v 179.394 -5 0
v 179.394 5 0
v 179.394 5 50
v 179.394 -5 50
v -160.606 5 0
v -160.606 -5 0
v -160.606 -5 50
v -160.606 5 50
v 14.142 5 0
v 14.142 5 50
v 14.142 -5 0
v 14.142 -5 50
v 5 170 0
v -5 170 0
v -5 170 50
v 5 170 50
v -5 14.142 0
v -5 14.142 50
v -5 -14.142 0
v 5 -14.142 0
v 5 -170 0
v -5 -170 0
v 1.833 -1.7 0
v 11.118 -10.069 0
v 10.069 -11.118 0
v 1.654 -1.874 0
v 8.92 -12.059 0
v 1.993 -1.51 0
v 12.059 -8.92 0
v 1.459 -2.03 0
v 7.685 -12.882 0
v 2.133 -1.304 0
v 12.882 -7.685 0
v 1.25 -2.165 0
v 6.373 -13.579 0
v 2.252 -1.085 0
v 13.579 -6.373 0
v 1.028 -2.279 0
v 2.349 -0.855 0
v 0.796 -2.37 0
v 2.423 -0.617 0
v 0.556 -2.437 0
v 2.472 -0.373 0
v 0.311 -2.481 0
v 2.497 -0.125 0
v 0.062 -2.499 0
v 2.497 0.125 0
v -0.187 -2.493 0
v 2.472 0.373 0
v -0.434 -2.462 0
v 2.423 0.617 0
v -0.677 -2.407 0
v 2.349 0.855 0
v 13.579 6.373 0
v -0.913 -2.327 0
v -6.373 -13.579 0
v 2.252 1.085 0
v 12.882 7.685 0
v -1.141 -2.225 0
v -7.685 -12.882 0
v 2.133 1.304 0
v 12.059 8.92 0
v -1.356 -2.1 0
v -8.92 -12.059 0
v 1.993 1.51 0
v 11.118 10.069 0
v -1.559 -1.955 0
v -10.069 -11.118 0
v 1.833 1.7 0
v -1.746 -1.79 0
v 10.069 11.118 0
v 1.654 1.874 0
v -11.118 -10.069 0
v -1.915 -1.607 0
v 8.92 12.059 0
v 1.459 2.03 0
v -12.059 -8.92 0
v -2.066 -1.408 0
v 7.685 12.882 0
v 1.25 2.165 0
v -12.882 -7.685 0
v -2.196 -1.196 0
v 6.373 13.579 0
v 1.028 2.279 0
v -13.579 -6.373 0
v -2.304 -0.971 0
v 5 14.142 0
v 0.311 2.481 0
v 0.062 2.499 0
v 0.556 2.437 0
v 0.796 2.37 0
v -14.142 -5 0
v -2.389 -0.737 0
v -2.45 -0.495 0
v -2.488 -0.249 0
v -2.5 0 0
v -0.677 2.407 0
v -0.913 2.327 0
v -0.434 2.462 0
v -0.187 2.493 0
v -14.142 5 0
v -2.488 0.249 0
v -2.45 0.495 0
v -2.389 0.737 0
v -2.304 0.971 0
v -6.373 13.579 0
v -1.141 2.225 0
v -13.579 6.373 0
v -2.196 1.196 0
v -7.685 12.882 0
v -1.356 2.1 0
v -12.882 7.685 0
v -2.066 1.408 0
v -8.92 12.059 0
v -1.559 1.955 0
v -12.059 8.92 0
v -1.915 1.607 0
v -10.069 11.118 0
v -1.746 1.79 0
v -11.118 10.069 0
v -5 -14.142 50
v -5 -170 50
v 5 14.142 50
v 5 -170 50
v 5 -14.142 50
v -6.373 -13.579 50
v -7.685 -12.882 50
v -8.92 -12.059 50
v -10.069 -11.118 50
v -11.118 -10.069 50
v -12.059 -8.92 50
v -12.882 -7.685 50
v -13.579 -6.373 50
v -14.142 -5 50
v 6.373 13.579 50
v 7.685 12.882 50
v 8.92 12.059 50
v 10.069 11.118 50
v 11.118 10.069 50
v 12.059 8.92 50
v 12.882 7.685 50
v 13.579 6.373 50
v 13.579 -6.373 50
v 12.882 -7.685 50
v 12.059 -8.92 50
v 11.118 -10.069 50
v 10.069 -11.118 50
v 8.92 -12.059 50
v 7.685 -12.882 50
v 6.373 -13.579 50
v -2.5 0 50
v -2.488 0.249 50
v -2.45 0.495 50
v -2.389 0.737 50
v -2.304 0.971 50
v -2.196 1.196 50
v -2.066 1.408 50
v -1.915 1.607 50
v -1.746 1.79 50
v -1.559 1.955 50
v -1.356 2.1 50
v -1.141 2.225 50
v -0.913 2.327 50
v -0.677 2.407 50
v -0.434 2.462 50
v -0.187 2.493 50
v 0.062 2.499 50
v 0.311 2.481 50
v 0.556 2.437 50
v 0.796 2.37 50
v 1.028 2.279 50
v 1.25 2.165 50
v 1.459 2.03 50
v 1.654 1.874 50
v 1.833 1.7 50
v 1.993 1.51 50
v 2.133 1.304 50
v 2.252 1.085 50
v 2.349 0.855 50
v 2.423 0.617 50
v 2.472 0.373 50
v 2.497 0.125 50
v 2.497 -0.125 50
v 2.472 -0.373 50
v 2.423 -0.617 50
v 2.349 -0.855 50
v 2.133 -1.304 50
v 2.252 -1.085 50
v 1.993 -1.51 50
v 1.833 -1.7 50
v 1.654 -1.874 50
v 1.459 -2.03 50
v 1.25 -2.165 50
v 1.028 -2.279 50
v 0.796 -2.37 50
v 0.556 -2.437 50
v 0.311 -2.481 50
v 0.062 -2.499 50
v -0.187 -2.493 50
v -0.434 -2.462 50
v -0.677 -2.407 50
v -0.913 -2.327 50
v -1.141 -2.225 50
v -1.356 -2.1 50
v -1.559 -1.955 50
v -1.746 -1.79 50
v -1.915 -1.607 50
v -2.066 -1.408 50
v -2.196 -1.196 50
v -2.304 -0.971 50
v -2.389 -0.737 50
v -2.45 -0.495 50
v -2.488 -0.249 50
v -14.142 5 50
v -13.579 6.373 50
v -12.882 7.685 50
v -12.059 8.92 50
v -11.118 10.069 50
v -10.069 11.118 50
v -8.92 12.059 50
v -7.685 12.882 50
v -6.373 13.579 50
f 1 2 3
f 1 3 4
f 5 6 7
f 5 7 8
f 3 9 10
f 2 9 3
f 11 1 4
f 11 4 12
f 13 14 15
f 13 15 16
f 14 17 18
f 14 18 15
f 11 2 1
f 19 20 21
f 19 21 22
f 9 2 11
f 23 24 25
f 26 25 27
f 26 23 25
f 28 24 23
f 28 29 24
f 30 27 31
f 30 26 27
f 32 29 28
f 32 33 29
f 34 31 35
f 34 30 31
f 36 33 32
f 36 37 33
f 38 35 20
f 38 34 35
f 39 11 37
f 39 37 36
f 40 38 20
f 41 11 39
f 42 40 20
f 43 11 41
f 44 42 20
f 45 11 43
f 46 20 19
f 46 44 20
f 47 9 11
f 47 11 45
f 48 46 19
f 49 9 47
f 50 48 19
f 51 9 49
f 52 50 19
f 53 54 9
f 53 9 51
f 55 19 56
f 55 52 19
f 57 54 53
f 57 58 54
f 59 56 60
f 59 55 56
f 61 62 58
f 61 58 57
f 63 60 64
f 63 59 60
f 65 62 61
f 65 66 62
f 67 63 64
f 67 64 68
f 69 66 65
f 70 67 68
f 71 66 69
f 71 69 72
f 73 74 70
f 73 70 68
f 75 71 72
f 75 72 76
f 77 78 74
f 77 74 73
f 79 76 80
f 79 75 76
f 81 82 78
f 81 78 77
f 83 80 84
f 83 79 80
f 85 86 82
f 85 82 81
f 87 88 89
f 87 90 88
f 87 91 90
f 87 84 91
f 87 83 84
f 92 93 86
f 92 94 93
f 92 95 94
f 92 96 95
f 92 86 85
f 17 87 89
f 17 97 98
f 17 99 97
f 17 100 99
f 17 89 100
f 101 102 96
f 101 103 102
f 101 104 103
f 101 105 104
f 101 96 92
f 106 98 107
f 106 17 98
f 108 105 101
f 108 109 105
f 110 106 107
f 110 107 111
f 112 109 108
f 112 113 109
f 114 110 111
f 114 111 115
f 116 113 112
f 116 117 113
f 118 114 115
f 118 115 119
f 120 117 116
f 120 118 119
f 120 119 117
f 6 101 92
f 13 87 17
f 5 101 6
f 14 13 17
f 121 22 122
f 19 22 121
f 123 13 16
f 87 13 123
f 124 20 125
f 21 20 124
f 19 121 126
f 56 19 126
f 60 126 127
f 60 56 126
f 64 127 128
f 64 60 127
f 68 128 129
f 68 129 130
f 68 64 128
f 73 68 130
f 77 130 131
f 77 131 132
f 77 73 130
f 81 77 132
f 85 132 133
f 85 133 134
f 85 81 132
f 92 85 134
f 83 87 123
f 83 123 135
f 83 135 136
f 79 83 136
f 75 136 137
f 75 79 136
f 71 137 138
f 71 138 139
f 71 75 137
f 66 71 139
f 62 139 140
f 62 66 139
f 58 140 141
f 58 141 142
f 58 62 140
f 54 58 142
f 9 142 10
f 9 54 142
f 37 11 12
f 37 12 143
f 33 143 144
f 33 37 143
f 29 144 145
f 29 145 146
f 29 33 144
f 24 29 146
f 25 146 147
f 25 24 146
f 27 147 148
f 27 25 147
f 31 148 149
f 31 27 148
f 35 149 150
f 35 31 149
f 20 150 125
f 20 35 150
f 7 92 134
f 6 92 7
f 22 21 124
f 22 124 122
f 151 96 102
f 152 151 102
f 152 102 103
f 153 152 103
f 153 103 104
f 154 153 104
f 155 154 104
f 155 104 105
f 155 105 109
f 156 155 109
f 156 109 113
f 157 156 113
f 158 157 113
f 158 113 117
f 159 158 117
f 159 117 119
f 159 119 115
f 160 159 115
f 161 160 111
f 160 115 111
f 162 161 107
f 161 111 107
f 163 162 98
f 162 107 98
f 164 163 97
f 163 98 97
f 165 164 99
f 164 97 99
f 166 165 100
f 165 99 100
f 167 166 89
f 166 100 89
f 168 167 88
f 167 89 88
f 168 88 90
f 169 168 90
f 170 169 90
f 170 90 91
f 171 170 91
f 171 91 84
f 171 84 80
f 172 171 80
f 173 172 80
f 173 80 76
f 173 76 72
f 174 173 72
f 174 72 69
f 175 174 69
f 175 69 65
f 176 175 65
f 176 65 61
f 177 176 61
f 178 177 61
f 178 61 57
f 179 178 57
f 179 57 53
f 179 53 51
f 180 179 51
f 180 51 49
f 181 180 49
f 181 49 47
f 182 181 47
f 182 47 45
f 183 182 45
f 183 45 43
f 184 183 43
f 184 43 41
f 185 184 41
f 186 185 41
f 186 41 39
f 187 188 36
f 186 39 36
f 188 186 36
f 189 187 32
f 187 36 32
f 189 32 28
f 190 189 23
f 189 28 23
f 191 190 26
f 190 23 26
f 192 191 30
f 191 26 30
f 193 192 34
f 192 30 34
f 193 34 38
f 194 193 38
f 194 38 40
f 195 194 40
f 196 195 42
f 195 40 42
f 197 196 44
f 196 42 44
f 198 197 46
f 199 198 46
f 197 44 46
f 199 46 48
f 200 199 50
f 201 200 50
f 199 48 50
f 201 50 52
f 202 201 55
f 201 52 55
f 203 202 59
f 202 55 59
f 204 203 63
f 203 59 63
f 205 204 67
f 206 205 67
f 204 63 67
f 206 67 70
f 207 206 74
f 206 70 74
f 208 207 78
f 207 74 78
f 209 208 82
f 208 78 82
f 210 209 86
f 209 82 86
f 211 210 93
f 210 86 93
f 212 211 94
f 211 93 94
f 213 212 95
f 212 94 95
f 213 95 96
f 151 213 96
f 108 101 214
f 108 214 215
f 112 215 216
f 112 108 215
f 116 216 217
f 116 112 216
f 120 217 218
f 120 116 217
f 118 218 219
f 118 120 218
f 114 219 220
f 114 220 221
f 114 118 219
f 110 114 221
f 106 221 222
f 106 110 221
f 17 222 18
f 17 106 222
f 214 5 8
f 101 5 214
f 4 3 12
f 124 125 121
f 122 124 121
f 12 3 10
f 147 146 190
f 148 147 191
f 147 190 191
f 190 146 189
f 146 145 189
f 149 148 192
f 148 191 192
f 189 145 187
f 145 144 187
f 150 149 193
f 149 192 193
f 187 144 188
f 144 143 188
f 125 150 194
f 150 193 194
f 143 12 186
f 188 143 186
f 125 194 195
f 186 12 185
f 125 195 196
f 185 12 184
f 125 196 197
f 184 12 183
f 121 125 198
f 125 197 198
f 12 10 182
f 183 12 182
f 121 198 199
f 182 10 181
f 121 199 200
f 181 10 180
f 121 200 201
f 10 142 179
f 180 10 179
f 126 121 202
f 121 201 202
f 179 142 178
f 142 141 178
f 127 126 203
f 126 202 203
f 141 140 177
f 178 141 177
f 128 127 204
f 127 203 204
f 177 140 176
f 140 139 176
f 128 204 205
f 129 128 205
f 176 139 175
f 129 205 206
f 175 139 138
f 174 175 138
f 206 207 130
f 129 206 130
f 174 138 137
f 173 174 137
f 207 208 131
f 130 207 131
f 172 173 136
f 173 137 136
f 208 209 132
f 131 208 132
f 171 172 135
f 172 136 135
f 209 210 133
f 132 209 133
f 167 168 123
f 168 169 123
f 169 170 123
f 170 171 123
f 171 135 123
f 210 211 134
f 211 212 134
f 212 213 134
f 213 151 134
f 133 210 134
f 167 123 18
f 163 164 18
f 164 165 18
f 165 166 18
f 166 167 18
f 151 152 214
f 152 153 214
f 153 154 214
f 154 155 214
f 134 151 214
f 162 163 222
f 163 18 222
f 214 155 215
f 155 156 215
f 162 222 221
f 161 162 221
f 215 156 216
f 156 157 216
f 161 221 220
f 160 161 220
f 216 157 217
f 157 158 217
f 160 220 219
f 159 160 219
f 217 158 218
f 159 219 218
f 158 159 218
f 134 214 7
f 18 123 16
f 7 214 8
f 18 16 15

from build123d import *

# Parameters (mm, degrees)
BOSS_EXTRUDE2_DEPTH      = 50
SKETCH2_R                = 15
BOSS_EXTRUDE3_DEPTH      = 50
F_5_0_5_DIAMETER_HOLE1_D = 5


with BuildPart() as part:
    # Sketch1 → Boss-Extrude2 (new body)
    with BuildSketch(Plane.XY):
        Polygon((-160.605737387, 5), (-5, 5), (-5, 170), (5, 170), (5, 5), (179.394262613, 5), (179.394262613, -5), (5, -5), (5, -170), (-5, -170), (-5, -5), (-160.605737387, -5), align=None)
    extrude(amount=BOSS_EXTRUDE2_DEPTH)

    # Sketch2 → Boss-Extrude3 (add)
    with BuildSketch(Plane(origin=(0, 0, 0), x_dir=(-1, 0, 0), z_dir=(0, 0, -1))):
        Circle(SKETCH2_R)
    extrude(amount=-BOSS_EXTRUDE3_DEPTH)

    # Ø5.0 (5) Diameter Hole1 (through all)
    with Locations(Plane.XY.offset(50)):
        with Locations((0, 0)):
            Hole(F_5_0_5_DIAMETER_HOLE1_D / 2)


solid = part.part
